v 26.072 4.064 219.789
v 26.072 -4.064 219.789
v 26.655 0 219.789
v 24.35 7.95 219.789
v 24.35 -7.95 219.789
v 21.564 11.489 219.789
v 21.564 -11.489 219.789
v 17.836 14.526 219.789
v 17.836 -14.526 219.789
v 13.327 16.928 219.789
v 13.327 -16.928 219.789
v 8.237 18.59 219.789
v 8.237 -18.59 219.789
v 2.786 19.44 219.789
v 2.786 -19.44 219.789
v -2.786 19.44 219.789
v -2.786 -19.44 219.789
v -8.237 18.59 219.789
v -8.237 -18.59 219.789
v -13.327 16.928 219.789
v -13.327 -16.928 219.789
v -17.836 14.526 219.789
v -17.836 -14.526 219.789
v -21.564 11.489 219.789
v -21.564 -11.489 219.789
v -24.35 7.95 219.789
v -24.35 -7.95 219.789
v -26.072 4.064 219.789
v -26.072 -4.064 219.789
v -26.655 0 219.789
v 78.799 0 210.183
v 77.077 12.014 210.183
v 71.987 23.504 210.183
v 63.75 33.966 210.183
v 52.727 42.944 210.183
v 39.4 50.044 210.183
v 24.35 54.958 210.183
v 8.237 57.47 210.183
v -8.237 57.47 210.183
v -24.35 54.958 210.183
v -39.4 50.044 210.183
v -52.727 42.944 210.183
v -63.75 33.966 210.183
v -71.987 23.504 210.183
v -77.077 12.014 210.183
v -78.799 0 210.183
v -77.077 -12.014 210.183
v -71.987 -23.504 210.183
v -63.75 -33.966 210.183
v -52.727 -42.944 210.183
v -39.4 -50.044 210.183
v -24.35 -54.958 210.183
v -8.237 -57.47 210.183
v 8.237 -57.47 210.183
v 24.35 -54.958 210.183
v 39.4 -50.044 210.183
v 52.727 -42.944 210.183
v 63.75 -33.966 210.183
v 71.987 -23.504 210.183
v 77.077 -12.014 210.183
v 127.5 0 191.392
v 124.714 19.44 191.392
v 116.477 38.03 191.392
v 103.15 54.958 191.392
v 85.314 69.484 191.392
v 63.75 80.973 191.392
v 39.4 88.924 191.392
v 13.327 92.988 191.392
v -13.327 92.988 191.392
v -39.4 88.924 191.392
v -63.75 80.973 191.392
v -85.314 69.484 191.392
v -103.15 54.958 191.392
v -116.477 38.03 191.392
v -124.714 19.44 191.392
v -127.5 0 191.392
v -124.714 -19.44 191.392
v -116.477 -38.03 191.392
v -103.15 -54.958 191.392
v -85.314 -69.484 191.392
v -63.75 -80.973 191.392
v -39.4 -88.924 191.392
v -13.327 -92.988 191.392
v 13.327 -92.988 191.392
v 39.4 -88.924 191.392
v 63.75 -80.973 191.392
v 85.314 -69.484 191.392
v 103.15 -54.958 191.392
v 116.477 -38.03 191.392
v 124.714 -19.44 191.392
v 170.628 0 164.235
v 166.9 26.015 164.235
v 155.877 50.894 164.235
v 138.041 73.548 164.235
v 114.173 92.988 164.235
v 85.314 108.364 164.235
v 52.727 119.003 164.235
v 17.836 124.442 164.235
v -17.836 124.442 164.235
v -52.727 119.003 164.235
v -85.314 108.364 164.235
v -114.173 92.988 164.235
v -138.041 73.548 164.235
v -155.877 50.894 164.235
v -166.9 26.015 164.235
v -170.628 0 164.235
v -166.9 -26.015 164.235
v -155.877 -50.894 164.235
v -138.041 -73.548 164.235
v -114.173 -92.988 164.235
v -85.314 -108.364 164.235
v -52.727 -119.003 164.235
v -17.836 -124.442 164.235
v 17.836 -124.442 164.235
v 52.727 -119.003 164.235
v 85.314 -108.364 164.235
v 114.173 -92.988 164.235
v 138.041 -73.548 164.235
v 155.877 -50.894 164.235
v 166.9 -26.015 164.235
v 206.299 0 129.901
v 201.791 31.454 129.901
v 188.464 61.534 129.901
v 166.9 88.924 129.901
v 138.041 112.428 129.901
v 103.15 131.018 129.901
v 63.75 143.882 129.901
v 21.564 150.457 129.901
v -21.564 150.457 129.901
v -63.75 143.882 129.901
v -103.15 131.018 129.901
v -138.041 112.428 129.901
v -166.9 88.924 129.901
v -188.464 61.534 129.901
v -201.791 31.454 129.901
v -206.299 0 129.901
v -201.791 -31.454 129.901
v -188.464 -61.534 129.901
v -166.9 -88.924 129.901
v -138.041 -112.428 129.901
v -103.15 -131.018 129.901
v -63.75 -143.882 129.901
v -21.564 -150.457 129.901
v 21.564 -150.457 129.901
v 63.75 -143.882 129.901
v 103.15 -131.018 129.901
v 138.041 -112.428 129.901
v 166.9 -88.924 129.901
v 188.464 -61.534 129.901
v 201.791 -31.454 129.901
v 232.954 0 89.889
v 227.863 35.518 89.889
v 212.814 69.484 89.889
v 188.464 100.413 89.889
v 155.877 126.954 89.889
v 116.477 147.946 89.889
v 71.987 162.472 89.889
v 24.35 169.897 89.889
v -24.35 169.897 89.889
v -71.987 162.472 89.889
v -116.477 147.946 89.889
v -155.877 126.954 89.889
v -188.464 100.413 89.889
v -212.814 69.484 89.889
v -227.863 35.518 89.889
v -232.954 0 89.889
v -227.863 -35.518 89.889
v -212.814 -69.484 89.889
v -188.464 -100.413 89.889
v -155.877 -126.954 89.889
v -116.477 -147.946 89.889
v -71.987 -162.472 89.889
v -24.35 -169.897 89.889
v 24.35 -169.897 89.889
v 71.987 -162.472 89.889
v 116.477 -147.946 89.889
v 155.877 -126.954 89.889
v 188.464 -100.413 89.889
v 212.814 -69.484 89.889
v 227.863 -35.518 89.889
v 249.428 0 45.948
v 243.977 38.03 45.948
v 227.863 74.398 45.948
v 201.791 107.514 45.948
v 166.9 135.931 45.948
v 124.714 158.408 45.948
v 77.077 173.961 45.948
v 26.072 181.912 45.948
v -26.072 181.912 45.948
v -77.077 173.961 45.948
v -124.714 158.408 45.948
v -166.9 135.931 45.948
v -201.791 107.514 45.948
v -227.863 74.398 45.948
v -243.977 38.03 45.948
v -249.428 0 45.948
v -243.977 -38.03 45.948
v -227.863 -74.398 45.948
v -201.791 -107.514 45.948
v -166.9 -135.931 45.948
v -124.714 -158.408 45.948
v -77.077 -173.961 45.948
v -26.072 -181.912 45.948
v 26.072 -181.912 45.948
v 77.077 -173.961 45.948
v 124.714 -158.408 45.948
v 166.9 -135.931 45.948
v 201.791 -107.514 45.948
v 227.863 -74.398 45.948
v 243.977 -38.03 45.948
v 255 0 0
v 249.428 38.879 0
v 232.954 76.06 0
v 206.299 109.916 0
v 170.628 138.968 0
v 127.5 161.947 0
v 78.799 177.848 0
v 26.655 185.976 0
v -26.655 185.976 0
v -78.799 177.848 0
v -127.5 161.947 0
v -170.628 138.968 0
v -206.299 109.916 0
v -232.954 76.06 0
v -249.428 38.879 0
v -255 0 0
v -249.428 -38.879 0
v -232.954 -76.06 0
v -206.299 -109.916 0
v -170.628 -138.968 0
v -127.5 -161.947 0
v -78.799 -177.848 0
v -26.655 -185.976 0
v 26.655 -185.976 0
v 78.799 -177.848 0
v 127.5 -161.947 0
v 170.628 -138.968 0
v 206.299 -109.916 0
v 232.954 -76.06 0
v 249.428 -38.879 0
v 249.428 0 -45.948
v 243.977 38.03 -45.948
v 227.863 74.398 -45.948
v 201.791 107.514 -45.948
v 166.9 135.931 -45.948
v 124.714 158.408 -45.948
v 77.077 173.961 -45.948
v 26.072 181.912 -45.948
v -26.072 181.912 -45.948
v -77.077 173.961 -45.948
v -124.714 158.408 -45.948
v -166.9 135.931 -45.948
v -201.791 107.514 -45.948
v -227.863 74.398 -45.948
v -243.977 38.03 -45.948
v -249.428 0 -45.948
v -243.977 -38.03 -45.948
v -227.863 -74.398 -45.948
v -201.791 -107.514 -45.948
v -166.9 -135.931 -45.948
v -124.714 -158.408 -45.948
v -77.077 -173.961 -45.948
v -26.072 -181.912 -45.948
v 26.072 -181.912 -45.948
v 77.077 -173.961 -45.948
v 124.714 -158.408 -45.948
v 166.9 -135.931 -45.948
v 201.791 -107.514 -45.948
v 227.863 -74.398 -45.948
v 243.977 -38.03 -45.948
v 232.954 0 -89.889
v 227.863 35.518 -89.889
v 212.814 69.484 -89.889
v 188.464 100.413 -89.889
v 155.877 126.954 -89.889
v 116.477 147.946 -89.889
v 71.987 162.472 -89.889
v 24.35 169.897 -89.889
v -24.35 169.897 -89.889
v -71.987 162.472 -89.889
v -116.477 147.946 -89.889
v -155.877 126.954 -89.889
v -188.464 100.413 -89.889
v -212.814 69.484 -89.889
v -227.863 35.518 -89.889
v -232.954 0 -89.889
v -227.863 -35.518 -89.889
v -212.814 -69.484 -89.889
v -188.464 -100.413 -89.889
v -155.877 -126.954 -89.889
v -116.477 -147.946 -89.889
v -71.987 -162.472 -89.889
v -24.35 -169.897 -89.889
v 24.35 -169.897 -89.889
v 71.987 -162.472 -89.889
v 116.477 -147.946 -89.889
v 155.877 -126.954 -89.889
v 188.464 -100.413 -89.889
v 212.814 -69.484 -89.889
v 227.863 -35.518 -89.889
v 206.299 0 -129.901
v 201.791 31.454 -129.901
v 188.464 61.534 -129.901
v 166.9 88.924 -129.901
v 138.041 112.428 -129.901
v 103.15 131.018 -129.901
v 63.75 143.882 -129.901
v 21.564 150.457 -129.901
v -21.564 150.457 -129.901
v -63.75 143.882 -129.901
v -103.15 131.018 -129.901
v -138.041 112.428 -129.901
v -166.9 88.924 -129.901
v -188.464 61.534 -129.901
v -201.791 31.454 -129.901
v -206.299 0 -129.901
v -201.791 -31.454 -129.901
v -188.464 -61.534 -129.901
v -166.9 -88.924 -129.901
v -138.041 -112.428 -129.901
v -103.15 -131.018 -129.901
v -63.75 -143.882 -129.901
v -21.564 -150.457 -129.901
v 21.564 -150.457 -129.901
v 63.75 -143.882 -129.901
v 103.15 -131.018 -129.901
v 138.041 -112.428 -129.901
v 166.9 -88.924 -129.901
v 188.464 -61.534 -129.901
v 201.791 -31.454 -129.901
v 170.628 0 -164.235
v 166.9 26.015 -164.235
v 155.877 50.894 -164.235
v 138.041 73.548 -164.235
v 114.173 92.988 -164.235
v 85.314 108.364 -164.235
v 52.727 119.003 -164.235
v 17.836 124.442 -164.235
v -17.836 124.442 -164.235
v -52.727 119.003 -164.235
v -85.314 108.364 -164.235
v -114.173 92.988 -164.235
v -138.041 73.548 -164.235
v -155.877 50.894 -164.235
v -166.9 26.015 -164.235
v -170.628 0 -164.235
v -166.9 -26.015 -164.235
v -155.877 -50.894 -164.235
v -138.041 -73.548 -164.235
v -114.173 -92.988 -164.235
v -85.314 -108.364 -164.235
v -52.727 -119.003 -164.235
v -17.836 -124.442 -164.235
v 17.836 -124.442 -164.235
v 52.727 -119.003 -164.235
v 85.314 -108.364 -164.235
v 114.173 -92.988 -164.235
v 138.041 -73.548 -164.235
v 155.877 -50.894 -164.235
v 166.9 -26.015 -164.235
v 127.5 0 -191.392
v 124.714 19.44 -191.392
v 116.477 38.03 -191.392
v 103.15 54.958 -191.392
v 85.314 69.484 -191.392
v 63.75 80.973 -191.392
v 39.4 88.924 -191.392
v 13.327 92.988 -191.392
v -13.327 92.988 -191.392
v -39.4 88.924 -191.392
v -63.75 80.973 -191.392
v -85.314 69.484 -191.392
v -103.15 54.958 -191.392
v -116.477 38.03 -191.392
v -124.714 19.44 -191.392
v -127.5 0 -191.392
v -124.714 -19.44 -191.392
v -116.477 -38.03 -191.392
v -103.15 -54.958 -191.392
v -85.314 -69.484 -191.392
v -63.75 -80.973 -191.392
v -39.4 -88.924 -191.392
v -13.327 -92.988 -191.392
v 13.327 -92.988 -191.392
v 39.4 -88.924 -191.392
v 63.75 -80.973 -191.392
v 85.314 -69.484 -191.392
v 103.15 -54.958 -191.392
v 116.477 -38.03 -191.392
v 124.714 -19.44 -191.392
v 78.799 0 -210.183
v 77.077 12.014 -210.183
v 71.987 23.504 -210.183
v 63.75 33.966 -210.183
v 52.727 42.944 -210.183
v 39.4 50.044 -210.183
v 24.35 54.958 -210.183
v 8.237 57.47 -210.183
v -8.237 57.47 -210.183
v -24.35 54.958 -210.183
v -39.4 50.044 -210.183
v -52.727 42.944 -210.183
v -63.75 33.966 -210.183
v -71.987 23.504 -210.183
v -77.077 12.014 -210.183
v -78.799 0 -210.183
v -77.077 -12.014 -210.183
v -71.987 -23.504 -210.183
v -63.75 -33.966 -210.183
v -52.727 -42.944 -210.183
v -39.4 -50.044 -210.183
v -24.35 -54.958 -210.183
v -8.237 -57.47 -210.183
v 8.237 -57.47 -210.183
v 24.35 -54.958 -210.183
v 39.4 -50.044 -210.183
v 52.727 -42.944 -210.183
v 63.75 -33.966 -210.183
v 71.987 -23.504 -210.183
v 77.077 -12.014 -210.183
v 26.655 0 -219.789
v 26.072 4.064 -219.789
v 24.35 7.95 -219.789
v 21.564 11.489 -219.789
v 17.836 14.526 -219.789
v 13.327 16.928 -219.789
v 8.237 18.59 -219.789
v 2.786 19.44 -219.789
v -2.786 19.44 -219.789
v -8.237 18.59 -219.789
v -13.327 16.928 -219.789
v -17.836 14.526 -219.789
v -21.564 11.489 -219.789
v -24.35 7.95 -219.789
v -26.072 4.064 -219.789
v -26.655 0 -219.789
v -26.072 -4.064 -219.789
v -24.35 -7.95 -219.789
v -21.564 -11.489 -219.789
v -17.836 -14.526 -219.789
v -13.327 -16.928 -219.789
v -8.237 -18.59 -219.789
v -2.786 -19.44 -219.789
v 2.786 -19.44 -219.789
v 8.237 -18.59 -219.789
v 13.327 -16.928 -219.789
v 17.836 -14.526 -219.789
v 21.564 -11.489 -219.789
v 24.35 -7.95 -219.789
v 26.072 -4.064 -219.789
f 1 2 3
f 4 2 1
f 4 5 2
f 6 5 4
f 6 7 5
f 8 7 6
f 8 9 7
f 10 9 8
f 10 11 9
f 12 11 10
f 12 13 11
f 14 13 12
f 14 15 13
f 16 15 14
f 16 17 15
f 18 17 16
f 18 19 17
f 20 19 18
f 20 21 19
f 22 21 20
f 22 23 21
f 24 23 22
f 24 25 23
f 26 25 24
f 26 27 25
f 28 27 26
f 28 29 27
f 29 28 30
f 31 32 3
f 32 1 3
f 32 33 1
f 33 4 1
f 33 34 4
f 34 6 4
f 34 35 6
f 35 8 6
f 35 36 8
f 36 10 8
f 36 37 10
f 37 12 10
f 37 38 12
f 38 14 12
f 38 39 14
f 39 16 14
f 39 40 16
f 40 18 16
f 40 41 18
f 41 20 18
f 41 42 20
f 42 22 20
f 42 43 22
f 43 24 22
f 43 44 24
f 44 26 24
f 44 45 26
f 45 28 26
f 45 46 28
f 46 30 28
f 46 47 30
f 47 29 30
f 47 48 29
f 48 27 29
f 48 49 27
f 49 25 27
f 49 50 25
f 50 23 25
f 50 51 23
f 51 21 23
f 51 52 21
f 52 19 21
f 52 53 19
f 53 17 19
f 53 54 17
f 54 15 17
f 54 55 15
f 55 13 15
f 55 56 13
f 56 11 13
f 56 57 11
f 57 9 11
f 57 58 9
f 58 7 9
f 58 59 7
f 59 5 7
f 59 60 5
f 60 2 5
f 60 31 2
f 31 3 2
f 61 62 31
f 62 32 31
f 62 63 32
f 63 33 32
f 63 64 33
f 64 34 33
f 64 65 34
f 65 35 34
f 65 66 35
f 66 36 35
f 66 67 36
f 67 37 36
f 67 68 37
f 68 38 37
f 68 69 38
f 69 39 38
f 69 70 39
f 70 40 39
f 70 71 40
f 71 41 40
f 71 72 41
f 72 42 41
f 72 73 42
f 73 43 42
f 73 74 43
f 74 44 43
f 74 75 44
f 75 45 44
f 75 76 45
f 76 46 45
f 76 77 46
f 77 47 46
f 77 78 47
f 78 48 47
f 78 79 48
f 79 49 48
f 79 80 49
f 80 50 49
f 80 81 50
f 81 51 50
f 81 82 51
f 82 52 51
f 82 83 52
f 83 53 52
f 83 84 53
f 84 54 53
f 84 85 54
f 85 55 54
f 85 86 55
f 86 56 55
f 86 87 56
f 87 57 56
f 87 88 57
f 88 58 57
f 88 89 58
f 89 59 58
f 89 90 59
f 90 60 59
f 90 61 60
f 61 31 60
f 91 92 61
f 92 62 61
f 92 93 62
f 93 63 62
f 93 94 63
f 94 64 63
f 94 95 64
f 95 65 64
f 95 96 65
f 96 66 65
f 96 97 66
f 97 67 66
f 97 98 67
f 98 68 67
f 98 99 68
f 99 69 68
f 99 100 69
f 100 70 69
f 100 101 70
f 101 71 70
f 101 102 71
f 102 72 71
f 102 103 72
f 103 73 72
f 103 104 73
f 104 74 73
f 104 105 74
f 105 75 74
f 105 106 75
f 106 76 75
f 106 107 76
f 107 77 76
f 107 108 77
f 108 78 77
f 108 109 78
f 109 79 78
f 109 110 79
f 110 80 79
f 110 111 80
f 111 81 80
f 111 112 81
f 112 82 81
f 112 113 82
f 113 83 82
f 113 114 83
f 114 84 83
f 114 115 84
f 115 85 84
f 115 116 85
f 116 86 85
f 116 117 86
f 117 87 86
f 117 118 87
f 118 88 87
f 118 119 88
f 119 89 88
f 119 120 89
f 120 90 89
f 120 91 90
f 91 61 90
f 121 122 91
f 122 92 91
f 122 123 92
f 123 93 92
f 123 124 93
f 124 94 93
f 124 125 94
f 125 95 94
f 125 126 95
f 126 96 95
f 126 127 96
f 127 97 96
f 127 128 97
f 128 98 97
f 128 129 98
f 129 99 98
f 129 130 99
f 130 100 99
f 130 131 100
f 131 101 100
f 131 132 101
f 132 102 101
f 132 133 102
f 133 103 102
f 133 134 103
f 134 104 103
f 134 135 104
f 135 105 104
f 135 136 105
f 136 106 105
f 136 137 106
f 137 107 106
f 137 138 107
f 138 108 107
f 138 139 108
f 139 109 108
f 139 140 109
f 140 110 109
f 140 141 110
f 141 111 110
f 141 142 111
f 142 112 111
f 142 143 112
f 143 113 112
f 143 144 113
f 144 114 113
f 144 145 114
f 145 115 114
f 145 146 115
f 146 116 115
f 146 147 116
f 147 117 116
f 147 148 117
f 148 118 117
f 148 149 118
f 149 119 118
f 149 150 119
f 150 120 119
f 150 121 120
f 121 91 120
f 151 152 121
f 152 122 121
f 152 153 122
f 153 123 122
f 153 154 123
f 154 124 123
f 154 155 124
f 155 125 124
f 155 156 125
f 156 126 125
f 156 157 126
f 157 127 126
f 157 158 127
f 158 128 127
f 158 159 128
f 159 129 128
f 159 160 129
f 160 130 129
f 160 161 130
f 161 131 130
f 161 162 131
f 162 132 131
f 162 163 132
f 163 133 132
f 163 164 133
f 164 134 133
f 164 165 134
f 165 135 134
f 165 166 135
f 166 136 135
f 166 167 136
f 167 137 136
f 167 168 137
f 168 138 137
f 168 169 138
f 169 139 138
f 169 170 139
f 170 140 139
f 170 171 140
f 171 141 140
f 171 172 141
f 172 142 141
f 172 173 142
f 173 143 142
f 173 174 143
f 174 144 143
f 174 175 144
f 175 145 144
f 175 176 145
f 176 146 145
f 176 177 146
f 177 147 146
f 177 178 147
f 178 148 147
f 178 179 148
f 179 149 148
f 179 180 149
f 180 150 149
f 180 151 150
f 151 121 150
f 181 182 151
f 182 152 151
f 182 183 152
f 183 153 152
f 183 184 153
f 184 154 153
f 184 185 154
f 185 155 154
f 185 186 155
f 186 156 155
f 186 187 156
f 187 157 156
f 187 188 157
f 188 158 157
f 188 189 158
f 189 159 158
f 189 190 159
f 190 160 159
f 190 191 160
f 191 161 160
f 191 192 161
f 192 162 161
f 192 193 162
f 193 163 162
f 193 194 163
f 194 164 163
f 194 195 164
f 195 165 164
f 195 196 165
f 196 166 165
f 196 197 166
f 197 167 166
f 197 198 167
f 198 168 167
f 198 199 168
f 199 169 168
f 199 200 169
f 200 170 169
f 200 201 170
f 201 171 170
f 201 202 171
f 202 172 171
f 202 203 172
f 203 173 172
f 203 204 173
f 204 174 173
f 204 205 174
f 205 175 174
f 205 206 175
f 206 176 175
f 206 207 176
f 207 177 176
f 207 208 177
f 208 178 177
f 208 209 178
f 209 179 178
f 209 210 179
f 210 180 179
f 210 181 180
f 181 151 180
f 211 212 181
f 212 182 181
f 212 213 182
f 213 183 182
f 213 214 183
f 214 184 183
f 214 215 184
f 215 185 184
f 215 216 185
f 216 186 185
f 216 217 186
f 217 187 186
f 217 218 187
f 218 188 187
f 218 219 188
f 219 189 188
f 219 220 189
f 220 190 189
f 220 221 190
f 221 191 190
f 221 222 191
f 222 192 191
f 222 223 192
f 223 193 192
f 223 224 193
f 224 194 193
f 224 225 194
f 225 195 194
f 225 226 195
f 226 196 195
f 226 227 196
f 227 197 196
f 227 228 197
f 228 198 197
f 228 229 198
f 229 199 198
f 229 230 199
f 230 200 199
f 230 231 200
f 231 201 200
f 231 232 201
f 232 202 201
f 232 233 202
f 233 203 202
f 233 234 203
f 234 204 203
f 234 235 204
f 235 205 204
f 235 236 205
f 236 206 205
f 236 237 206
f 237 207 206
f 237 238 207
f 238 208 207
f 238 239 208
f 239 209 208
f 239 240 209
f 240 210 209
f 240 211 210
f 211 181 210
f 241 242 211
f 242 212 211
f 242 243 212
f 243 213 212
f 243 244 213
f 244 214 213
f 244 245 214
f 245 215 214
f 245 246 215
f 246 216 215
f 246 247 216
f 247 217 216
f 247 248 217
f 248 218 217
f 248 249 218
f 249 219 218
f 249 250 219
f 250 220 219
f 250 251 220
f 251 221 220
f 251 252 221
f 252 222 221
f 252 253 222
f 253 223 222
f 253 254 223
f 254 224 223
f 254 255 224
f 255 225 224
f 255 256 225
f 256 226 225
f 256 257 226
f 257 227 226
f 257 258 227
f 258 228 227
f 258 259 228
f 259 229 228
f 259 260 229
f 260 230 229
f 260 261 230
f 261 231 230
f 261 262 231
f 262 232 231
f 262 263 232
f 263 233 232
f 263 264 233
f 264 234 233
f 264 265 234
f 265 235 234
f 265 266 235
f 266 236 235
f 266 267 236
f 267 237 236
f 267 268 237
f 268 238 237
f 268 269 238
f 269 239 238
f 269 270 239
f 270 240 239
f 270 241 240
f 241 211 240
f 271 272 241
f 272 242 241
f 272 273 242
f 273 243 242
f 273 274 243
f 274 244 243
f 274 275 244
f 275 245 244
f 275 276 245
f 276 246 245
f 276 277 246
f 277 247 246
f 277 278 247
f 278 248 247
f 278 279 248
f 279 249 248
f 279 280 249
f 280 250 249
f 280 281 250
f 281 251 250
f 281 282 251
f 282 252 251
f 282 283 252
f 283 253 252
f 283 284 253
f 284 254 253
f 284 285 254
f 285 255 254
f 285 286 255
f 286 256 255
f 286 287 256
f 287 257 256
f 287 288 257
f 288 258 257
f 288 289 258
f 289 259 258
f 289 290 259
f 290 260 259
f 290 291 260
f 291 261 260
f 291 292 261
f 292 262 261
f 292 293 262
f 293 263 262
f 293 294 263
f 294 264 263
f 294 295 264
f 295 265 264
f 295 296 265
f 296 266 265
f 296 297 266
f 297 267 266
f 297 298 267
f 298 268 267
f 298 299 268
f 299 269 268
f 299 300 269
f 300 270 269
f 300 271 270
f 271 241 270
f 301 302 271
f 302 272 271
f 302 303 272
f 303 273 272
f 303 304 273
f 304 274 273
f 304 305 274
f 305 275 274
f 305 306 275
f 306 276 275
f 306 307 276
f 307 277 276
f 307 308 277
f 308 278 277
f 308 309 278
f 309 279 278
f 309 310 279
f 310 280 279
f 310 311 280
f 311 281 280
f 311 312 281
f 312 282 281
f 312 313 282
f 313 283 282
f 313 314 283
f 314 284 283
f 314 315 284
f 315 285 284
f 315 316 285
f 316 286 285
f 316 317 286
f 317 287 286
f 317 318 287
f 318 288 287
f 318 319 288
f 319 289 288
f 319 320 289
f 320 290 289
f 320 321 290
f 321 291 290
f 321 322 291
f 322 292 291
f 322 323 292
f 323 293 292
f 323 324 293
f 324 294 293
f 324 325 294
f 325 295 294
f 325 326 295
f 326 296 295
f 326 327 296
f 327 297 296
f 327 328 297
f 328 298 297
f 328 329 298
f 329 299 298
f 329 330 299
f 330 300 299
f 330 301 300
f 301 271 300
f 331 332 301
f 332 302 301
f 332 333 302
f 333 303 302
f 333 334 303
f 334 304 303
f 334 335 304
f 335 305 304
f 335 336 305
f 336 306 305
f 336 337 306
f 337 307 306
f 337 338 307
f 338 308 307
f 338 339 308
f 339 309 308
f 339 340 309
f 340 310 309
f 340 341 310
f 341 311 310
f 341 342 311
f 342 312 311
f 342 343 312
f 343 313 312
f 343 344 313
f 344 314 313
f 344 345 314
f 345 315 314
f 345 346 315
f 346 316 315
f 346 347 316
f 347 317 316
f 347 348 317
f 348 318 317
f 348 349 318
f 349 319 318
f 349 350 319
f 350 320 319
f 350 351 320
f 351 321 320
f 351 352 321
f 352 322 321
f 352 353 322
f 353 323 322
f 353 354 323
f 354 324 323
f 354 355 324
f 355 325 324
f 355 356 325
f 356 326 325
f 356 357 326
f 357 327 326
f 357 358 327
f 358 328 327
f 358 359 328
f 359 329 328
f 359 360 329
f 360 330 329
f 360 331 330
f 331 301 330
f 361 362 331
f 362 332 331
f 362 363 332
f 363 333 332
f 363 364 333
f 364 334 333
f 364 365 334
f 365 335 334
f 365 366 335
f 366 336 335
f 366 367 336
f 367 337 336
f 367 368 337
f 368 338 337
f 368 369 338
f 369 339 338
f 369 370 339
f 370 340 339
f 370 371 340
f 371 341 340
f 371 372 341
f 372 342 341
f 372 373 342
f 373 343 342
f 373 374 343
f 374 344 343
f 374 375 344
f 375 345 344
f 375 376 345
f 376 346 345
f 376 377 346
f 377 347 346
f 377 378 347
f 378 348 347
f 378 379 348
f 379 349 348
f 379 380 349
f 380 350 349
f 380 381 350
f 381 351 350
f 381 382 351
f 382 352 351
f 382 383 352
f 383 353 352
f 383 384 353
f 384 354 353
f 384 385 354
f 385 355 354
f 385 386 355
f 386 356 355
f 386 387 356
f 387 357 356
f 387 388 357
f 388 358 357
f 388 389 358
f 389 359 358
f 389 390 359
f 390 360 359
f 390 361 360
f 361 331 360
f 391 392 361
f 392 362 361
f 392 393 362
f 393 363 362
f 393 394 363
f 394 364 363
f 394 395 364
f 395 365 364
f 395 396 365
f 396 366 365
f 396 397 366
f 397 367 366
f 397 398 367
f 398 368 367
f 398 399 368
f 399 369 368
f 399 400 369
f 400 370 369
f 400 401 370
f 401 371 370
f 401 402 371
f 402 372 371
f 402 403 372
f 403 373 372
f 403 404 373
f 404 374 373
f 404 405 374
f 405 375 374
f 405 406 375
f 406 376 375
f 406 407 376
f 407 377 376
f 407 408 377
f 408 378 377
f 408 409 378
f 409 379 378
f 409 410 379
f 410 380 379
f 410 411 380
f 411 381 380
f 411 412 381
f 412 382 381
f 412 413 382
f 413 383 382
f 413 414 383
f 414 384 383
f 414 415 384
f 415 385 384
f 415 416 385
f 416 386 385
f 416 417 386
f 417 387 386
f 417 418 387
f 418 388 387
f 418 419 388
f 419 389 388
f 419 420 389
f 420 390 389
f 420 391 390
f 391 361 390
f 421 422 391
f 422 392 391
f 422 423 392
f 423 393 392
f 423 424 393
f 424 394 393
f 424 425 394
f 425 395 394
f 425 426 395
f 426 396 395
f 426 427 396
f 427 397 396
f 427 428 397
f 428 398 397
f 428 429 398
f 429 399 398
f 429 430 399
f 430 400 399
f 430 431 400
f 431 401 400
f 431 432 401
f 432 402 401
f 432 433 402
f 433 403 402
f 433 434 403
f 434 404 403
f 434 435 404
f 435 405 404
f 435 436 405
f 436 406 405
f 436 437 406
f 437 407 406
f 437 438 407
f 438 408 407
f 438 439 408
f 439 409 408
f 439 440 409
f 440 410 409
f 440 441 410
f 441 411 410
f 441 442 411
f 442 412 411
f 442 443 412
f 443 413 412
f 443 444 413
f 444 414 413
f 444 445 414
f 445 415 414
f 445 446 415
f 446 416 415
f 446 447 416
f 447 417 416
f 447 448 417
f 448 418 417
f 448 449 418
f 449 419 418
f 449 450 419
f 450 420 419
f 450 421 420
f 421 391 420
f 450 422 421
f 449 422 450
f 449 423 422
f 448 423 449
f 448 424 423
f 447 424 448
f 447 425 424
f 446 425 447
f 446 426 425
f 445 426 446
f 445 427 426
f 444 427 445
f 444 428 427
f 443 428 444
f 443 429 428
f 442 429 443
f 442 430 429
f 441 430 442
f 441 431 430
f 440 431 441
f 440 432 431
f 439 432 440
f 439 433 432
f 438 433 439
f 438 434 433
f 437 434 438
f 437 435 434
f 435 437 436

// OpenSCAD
// Generated by SolidPython 1.0.1 on 2020-07-29 00:46:52


scale(v = [15, 11, 13]) {
	sphere(r = 17);
}
/***********************************************
*********      SolidPython code:      **********
************************************************
 
# import packages: SolidPython
from solid import *
from solid.utils import *
from itertools import chain, combinations, permutations


class Resize:

    def __init__(self, scad_file):
        self.scad_file = scad_file
        #self.scad_file = import_scad(scad_file)
        # cone/cylinder param:
        self.r1 = 0
        self.r2 = 0
        self.h = 0
        # rectangular prism param:
        self.w = 0
        self.l = 0
        # ellipse param:
        self.r = 0

    # import OpenScad code (file name corresponds to shape)


    # classify shape + parameters
    def assign(self, param1, param2, param3):
        if self.scad_file == 'cone.scad':
            self.r1 = param1
            self.r2 = param2
            self.h = param3
        elif self.scad_file == 'cylinder.scad':
            self.r1 = param1
            self.r2 = param2
            self.h = param3
        elif self.scad_file == 'rectangularPrism.scad':
            self.h = param1
            self.l = param2
            self.w = param3
        else:
            self.r = param1
            self.h = param2

    # resize parameters
    def iterate(self):
        x = range(3, 20, 2)
        i = 1
        if self.scad_file == 'cone.scad':
            tempList = list(permutations(x, 2))
            for temp in tempList:
                param1 = temp[0]
                param2 = temp[1]
                filepath = 'produced_scad_files/' + 'cone' + str(param1) + '_' + str(param2) + '_' + '.scad'
                scad_render_to_file(cylinder(h=param1, r1=param2, r2=0), filepath)

        elif self.scad_file == 'cylinder.scad':
            tempList = list(permutations(x, 3))
            for temp in tempList:
                param1 = temp[0]
                param2 = temp[1]
                filepath = 'produced_scad_files/' + 'cylinder' + str(param1) + '_' + str(param2) + '_' + '.scad'
                scad_render_to_file(cylinder(h=param1, r1=param2, r2=param2), filepath)

        elif self.scad_file == 'rectangularPrism.scad':
            tempList = list(permutations(x, 3))
            for temp in tempList:
                param1 = temp[0]
                param2 = temp[1]
                param3 = temp[2]
                filepath = 'produced_scad_files/' + 'rectangularPrism' + str(param1) + '_' + str(param2) + '_' + str(
                    param3) + '.scad'
                scad_render_to_file(cube(size=(param1, param2, param3)), filepath)

        elif self.scad_file == 'ellipse.scad':
            tempList = list(permutations(x, 4))
            for temp in tempList:
                param1 = temp[0]
                param2 = temp[1]
                param3 = temp[2]
                param4 = temp[3]
                filepath = 'produced_scad_files/' + 'ellipse' + str(param1) + '_' + str(param2) + '_' + str(param3) + '_' + str(param4) + '.scad'
                scad_render_to_file(scale([param1, param2, param3])(sphere(r=param4)), filepath)

    def render_to_scadfile(self):
        scad_render_to_file(scad, 'example.scad') 
 
************************************************/
